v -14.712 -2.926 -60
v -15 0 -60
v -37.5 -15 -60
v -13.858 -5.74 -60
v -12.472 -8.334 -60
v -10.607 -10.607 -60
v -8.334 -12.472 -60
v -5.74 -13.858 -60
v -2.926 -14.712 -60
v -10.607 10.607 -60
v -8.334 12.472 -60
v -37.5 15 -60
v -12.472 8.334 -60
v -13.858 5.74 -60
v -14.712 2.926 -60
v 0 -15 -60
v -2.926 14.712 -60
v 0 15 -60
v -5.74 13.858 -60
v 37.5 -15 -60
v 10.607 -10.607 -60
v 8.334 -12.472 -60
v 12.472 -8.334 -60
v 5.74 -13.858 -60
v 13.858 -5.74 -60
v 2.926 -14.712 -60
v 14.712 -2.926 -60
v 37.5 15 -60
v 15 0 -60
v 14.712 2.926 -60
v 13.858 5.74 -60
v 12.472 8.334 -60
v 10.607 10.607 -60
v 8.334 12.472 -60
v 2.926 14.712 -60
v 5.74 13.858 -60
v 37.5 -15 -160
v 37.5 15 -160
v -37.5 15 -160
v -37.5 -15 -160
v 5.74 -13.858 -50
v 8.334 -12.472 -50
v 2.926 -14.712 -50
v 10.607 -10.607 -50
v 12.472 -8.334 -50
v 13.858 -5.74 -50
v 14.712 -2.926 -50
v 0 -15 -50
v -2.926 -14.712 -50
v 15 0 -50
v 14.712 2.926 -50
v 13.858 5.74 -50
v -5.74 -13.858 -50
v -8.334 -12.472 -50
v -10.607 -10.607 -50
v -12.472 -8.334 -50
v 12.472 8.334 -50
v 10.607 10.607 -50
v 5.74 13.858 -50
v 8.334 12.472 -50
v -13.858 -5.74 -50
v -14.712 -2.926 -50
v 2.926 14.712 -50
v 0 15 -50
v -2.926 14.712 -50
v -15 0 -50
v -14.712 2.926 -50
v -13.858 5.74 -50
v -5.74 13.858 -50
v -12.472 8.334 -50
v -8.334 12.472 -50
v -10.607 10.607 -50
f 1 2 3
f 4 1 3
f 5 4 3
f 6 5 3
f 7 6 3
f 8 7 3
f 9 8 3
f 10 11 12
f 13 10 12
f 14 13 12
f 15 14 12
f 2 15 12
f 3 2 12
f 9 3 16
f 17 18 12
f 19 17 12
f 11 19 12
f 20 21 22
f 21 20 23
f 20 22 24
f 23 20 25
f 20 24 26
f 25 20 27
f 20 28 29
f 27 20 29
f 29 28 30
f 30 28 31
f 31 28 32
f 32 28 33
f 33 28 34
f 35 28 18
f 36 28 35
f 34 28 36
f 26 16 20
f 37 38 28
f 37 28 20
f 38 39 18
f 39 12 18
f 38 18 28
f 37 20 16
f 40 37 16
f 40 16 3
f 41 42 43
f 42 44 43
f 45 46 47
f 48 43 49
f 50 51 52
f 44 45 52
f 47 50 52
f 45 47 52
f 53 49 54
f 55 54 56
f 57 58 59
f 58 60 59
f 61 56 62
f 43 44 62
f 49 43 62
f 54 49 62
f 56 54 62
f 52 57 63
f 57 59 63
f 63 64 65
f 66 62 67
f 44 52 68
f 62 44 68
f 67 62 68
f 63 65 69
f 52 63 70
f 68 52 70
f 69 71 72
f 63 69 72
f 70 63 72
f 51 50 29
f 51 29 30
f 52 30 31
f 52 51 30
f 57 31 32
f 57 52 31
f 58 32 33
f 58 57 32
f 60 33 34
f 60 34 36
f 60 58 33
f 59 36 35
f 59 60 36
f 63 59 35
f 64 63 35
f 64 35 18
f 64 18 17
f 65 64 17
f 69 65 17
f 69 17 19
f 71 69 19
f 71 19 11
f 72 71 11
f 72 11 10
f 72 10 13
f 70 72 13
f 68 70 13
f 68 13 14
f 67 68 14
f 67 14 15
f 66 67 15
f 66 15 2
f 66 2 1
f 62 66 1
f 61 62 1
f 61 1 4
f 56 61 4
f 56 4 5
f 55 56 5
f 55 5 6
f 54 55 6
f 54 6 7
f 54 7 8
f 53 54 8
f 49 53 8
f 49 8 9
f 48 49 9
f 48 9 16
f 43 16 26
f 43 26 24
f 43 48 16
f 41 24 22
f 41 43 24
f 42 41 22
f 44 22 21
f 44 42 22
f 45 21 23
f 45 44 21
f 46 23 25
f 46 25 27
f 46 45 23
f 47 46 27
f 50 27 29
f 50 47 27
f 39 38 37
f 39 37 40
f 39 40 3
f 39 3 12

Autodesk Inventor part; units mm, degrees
ref_plane "YZ Plane" through (0, 0, 0) normal (1, 0, 0) x (0, 1, 0)
ref_plane "XZ Plane" through (0, 0, 0) normal (0, 1, 0) x (-1, 0, 0)
sketch "スケッチ2" plane through (0, 0, 0) normal (0, 0, 1) x (1, 0, 0)
  circle A0 centre (0, 0) radius 15
  dimension "d2" = 30
extrude "押し出し1" add sketch "スケッチ2" against normal blind 60
sketch "スケッチ3" plane through (0, 0, -60) normal (0, 0, -1) x (-1, 0, 0)
  line L0 (37.5, 15) -> (-37.5, 15)
  line L1 (-37.5, 15) -> (-37.5, -15)
  line L2 (-37.5, -15) -> (37.5, -15)
  line L3 (37.5, -15) -> (37.5, 15)
  point P0 (0, 0)
  point P1 (0, 15)
  point P2 (37.5, 0)
  dimension "d5" = 30
  dimension "d6" = 75
extrude "押し出し2" add sketch "スケッチ3" along normal blind 100
sketch "スケッチ4" plane through (0, 0, 0) normal (0, 1, 0) x (-1, 0, 0)
  line L0 (63.5061, 71.4951) -> (-75.4219, 71.4951)
  line L1 (-75.4219, 71.4951) -> (-75.4219, -50)
  line L2 (-75.4219, -50) -> (63.5061, -50)
  line L3 (63.5061, -50) -> (63.5061, 71.4951)
  line L4 (-103.2075, 0) -> (91.2917, 0) projected
  point P0 (0, 0)
  dimension "d9" = 50
extrude "押し出し3" cut sketch "スケッチ4" against normal mid plane 100
properties part number "HandY"
